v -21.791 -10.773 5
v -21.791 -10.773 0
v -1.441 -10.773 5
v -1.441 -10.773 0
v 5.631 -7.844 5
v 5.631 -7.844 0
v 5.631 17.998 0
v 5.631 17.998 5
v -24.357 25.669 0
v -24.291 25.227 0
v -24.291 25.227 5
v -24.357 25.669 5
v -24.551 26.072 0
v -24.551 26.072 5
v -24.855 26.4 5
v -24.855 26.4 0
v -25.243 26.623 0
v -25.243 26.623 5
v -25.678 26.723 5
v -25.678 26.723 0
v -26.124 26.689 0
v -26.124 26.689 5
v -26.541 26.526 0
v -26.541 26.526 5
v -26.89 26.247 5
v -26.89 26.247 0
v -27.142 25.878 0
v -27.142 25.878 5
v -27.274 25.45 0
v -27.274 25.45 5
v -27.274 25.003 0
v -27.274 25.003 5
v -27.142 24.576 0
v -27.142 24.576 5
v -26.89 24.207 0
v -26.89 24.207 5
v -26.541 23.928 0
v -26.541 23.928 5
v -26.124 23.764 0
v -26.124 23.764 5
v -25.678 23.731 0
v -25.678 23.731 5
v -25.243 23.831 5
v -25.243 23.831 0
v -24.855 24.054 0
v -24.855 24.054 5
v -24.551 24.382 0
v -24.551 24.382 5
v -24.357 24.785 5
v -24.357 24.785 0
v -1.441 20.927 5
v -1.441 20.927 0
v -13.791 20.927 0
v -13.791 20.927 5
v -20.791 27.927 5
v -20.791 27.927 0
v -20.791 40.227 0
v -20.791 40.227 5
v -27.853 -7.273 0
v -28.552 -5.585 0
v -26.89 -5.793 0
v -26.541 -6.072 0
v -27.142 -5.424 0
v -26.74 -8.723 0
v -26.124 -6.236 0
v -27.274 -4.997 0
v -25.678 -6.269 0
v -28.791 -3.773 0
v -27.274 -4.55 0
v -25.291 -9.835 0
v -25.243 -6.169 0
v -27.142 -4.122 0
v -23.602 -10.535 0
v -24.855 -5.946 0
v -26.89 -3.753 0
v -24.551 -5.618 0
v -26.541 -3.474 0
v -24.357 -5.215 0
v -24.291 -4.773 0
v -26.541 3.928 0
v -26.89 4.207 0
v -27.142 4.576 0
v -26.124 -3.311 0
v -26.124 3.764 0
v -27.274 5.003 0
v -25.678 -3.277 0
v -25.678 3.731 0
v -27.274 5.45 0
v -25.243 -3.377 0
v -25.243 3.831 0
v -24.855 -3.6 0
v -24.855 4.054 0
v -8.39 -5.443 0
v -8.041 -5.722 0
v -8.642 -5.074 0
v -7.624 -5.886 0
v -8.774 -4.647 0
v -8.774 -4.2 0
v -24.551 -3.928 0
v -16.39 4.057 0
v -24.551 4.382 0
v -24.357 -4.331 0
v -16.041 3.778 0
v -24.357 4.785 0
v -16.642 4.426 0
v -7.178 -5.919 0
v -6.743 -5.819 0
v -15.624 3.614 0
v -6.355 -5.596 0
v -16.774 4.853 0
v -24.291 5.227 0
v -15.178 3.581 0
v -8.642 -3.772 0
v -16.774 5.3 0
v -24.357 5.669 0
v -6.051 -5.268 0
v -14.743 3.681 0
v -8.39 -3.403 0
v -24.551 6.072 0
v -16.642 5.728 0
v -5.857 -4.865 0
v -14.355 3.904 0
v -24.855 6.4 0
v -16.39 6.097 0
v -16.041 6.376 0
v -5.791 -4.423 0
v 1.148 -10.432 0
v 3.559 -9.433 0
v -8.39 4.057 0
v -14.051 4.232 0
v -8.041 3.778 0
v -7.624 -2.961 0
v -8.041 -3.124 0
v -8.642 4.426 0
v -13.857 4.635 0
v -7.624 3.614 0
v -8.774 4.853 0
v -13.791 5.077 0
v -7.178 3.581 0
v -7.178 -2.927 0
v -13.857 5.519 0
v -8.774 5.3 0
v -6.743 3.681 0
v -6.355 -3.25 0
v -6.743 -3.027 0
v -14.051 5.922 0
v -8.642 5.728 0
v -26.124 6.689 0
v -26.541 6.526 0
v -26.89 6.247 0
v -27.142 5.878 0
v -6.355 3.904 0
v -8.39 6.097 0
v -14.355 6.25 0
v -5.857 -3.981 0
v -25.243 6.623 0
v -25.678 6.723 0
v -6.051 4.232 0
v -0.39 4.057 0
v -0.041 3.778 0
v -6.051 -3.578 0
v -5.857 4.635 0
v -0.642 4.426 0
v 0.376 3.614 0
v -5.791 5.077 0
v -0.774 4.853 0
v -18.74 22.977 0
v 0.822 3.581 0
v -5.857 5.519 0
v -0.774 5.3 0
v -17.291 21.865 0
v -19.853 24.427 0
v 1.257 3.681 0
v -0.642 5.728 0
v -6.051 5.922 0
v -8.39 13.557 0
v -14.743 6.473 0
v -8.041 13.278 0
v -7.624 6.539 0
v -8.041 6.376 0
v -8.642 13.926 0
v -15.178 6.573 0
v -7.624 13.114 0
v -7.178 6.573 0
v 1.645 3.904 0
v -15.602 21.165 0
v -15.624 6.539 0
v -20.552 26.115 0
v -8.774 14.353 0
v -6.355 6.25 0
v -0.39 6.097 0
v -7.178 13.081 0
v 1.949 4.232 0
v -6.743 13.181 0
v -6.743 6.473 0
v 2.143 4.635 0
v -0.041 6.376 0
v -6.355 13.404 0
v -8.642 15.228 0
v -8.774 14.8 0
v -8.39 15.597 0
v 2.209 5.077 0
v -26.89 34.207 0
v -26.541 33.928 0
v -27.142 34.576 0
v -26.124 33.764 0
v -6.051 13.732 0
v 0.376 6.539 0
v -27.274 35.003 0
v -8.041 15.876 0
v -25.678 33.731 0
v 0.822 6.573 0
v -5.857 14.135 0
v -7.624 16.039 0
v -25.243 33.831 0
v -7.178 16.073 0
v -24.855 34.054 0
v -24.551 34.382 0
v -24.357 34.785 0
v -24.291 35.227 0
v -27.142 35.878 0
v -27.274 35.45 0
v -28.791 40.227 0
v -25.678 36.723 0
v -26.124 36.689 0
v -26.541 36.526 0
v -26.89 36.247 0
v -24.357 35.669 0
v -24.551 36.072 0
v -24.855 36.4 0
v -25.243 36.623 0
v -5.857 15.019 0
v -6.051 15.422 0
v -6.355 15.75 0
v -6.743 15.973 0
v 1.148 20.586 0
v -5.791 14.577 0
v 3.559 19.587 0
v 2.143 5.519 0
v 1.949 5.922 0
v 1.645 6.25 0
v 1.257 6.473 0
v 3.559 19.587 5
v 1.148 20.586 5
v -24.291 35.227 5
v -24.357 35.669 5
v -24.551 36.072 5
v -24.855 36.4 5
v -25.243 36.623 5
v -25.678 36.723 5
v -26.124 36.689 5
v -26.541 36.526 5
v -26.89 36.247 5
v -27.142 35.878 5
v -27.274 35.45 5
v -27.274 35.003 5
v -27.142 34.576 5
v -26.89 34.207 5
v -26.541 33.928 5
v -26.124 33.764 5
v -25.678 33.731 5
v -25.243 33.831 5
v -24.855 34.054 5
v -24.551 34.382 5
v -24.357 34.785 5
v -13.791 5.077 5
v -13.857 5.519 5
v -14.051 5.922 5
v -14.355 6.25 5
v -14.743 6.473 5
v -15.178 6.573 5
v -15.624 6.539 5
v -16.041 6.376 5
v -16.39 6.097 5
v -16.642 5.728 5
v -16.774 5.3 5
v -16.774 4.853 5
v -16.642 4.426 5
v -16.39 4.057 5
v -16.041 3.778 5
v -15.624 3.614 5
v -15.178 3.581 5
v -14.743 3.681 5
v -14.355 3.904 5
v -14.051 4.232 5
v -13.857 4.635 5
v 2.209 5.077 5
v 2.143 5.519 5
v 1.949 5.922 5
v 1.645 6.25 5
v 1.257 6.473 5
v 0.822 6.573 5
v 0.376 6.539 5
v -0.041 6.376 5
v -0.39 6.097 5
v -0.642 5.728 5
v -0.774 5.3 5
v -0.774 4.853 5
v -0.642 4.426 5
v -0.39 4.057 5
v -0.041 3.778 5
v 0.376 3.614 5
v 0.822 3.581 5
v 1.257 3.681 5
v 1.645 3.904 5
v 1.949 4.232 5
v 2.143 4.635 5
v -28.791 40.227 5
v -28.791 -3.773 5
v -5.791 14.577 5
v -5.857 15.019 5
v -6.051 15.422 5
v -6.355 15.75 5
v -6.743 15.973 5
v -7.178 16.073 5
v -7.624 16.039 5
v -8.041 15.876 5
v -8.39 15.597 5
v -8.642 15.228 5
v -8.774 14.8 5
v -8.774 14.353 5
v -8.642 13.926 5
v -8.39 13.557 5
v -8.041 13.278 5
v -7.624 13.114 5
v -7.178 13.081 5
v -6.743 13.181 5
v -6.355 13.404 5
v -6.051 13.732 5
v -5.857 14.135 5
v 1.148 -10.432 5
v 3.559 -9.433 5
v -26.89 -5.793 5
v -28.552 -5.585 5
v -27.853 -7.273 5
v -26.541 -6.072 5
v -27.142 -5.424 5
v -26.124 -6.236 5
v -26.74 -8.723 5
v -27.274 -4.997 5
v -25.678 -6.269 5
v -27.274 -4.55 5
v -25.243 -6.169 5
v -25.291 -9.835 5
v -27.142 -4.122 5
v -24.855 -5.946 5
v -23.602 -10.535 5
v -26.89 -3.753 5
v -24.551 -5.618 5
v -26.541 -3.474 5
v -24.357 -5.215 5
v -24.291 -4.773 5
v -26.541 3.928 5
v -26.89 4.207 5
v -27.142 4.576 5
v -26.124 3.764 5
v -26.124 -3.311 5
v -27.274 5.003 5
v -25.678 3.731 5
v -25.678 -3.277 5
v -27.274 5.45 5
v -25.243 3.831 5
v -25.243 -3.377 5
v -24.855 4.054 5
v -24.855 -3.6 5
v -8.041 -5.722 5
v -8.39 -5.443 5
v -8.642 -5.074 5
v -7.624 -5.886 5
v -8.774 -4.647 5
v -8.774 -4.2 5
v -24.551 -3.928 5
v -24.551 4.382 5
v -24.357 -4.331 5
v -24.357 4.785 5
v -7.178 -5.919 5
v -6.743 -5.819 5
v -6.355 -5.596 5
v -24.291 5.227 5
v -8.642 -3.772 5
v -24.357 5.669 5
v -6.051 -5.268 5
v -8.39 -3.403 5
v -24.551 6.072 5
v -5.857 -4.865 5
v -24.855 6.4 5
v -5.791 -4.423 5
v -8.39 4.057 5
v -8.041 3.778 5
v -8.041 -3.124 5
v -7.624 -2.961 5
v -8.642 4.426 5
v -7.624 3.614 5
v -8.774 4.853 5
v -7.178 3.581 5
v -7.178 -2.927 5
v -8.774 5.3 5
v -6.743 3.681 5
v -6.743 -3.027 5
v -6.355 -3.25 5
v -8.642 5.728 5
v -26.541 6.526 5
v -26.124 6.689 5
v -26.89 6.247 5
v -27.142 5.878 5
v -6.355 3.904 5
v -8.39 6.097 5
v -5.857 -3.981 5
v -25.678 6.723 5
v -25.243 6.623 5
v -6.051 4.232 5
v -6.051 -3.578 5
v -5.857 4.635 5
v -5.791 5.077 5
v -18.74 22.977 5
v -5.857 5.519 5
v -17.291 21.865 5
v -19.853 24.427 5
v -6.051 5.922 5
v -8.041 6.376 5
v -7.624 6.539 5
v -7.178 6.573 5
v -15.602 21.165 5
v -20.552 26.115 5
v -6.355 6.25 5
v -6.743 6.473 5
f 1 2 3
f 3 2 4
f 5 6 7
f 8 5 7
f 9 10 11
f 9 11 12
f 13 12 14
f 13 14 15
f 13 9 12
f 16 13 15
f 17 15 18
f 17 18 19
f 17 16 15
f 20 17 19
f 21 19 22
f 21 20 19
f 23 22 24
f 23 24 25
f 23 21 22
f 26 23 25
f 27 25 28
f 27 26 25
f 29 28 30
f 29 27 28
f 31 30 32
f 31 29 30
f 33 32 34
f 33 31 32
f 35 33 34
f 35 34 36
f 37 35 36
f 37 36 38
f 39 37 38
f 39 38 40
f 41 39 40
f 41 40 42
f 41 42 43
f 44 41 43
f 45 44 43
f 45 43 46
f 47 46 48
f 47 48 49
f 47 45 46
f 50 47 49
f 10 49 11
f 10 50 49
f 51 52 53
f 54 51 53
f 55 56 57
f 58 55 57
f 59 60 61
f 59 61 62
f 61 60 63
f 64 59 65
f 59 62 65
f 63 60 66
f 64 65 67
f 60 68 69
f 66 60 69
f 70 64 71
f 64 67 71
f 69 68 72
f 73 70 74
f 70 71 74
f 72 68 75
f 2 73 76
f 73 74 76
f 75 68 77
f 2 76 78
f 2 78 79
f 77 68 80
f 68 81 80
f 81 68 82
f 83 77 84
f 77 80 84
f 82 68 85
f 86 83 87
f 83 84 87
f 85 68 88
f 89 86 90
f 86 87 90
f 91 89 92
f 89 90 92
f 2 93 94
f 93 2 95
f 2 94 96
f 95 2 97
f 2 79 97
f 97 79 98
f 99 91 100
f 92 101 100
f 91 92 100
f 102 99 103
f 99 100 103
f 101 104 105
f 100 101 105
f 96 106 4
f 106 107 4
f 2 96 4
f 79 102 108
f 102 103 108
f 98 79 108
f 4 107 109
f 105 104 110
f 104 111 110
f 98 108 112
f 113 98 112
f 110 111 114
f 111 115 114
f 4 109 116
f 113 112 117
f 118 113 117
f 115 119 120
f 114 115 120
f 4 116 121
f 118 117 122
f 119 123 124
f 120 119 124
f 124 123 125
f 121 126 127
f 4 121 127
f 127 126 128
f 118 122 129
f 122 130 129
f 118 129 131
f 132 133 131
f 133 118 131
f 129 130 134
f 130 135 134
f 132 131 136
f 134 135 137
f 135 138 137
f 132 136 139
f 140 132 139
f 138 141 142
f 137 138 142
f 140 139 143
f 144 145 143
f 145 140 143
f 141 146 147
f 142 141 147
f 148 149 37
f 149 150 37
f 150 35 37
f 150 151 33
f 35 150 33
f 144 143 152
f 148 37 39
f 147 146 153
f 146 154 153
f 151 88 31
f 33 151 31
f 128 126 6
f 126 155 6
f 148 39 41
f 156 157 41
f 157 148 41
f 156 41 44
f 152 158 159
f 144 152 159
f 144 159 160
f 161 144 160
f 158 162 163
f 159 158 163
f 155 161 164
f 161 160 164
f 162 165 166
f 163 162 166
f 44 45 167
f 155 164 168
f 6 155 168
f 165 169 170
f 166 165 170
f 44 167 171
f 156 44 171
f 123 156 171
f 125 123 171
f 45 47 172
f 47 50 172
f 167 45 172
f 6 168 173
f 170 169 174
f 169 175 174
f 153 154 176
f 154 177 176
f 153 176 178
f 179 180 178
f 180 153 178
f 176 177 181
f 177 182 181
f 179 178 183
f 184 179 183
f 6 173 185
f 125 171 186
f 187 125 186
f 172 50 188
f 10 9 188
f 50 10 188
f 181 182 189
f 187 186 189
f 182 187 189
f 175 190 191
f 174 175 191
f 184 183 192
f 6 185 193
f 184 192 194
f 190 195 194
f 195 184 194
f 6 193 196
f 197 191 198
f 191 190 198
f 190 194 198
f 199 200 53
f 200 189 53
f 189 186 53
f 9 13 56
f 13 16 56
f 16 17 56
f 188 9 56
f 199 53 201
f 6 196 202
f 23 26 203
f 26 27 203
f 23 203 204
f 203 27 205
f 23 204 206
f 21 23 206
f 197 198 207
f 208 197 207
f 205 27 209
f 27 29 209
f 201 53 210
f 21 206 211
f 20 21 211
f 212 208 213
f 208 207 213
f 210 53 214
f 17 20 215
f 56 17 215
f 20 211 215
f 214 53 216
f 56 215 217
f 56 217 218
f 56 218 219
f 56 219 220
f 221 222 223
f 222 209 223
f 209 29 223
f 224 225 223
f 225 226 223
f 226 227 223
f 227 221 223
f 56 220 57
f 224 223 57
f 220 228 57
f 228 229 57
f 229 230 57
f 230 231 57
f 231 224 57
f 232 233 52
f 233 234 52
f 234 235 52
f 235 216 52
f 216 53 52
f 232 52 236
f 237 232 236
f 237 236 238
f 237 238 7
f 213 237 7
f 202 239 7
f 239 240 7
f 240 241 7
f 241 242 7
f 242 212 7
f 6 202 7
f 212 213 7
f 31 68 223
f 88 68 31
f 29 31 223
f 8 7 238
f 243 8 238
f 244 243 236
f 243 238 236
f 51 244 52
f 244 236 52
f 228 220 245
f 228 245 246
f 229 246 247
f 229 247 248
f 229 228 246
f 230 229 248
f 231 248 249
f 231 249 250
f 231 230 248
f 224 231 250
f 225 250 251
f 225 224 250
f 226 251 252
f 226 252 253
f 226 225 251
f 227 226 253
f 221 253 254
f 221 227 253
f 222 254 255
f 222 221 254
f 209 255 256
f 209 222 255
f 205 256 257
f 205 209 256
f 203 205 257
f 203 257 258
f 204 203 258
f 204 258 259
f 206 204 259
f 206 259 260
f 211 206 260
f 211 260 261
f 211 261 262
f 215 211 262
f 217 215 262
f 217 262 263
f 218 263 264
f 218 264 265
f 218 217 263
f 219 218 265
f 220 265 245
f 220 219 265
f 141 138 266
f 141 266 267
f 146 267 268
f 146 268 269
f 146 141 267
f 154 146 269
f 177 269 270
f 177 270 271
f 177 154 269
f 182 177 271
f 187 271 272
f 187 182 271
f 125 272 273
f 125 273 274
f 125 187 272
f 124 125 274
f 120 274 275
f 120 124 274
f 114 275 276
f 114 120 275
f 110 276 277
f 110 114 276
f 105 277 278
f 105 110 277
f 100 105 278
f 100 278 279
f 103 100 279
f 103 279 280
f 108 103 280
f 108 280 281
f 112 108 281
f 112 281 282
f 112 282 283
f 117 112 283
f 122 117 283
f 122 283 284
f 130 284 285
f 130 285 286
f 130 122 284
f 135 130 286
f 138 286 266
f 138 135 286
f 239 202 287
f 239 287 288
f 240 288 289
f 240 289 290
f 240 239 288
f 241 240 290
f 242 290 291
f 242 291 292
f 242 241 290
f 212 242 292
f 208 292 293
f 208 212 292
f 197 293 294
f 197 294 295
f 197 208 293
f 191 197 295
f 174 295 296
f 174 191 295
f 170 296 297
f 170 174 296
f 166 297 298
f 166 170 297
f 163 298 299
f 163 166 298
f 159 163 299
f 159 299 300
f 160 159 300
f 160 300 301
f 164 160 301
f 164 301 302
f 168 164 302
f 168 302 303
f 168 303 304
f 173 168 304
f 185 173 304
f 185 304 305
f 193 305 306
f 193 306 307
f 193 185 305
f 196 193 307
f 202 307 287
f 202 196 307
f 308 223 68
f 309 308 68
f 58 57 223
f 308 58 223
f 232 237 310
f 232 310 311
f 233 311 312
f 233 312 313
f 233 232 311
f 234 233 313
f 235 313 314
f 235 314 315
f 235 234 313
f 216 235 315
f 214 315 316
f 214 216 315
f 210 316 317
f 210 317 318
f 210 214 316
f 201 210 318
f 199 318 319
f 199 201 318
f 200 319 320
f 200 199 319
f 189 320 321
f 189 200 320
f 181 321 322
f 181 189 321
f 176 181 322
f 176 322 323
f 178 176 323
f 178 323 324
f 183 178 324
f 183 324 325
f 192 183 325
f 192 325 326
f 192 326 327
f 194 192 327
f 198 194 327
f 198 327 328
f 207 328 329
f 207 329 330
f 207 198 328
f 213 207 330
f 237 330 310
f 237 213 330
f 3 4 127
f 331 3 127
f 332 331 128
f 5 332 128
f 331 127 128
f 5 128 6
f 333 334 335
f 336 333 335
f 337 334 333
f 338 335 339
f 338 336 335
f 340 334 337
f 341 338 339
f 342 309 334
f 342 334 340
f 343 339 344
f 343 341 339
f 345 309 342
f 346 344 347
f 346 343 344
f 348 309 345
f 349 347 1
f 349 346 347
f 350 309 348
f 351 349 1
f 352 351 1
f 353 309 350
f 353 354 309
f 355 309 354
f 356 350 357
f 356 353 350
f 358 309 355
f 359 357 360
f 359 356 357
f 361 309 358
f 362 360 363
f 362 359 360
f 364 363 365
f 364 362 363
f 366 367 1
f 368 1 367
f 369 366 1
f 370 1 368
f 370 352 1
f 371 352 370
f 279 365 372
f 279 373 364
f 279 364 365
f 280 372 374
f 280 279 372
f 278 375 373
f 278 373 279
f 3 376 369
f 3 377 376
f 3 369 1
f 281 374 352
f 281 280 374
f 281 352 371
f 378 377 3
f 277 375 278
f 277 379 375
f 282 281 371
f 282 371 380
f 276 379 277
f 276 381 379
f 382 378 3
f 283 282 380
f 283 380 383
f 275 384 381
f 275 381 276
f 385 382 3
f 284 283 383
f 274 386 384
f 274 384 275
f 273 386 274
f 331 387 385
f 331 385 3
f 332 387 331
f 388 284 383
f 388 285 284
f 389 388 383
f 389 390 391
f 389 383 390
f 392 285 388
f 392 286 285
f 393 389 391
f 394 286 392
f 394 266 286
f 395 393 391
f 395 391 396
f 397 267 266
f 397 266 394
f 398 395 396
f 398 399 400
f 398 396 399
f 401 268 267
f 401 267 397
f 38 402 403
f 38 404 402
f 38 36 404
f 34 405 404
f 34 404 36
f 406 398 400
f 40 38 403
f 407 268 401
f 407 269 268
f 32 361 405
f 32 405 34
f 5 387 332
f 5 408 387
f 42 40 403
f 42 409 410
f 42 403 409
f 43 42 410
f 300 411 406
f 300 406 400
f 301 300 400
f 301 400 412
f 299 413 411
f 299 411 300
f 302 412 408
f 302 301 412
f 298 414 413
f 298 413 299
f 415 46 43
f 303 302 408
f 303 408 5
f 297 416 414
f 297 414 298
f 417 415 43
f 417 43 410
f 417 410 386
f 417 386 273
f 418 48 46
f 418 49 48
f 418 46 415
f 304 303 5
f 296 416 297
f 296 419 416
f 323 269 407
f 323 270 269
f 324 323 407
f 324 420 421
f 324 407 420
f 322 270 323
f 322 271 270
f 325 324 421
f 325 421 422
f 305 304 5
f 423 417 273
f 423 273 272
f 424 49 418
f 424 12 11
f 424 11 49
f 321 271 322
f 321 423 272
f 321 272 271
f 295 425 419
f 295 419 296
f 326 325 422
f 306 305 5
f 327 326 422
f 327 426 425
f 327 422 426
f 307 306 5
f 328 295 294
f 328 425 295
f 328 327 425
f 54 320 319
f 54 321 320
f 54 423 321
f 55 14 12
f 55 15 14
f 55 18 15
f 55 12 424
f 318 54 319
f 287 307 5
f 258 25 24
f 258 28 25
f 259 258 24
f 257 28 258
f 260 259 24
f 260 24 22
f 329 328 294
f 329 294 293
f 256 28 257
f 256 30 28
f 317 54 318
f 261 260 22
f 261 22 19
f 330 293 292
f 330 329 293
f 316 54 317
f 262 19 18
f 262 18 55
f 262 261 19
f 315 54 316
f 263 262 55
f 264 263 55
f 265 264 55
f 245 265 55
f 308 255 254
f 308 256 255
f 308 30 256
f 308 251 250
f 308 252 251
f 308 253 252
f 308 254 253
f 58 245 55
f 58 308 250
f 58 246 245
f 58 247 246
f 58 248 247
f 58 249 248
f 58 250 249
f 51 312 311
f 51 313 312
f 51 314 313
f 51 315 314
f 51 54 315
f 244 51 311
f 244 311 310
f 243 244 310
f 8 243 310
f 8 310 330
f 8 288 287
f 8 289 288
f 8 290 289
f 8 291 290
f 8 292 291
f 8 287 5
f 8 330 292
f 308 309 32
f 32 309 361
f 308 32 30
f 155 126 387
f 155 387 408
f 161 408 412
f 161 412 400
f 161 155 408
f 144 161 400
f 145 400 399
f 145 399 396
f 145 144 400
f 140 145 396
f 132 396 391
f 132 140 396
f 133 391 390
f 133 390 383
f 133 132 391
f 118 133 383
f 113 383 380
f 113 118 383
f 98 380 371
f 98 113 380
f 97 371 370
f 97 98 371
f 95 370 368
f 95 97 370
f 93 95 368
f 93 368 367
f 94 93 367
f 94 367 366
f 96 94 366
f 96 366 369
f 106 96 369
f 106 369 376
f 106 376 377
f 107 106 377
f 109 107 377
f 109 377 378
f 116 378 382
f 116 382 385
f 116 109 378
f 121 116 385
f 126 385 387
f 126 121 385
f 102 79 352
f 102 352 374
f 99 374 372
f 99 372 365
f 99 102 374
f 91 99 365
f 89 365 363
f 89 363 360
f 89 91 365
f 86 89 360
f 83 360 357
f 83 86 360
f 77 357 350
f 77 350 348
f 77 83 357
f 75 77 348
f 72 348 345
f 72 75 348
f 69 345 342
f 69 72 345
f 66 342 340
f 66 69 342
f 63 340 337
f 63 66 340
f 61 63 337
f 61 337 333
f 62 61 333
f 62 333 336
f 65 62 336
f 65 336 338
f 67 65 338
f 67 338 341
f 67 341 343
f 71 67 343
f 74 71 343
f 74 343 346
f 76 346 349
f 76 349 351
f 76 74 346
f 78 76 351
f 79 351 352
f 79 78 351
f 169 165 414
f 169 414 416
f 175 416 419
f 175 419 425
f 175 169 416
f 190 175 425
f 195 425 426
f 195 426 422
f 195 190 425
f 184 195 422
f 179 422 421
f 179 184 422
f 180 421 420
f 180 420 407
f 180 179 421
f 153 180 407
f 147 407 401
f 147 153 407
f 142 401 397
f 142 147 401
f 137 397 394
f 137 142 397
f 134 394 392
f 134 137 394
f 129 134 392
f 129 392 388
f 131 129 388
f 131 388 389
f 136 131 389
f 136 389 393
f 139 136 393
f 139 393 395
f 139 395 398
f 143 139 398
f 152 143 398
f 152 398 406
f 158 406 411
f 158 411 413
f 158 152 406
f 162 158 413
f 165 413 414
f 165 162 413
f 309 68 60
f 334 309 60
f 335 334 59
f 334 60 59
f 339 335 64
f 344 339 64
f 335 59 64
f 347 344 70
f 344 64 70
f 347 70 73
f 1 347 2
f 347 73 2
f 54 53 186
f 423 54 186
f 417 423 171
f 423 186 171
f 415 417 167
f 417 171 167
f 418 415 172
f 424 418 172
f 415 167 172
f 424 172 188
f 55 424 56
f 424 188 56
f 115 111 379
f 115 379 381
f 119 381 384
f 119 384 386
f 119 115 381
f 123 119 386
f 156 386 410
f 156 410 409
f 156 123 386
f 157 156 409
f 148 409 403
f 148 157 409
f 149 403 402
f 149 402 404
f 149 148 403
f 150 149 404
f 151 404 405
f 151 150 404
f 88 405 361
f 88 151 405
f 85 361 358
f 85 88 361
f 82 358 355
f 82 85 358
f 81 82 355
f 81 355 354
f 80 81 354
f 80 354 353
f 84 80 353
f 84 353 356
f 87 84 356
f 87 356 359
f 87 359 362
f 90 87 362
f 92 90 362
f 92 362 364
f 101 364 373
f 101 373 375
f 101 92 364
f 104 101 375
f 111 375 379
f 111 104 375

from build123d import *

# Parameters (mm, degrees)
CROQUIS1_R              = 1.5
SALIENTE_EXTRUIR1_DEPTH = 5


with BuildPart() as part:
    # Croquis1 → Saliente-Extruir1 (new body)
    with BuildSketch(Plane.XY):
        with BuildLine():
            Line((-28.790532902, 40.226856436), (-28.790532902, 20.926856436))
            Line((-28.790532902, 20.926856436), (-28.790532902, -0.073143564))
            Line((-28.790532902, -0.073143564), (-28.790532902, -3.773143564))
            ThreePointArc((-28.790532902, -3.773143564), (-26.740280371, -8.722891033), (-21.790532902, -10.773143564))
            Line((-21.790532902, -10.773143564), (-1.440532902, -10.773143564))
            ThreePointArc((-1.440532902, -10.773143564), (2.386301421, -10.011938889), (5.630534909, -7.844211376))
            Line((5.630534909, -7.844211376), (5.630534909, 17.997924248))
            ThreePointArc((5.630534909, 17.997924248), (2.386301421, 20.165651761), (-1.440532902, 20.926856436))
            Line((-1.440532902, 20.926856436), (-13.790532902, 20.926856436))
            ThreePointArc((-13.790532902, 20.926856436), (-18.740280371, 22.977108967), (-20.790532902, 27.926856436))
            Line((-20.790532902, 27.926856436), (-20.790532902, 40.226856436))
            Line((-20.790532902, 40.226856436), (-28.790532902, 40.226856436))
        make_face()
        with Locations((-25.790532902, -4.773143564)):
            Circle(CROQUIS1_R, mode=Mode.SUBTRACT)
        with Locations((-25.790532902, 5.226856436)):
            Circle(CROQUIS1_R, mode=Mode.SUBTRACT)
        with Locations((-15.290532902, 5.076856436)):
            Circle(CROQUIS1_R, mode=Mode.SUBTRACT)
        with Locations((-7.290532902, -4.423143564)):
            Circle(CROQUIS1_R, mode=Mode.SUBTRACT)
        with Locations((-7.290532902, 5.076856436)):
            Circle(CROQUIS1_R, mode=Mode.SUBTRACT)
        with Locations((-7.290532902, 14.576856436)):
            Circle(CROQUIS1_R, mode=Mode.SUBTRACT)
        with Locations((0.709467098, 5.076856436)):
            Circle(CROQUIS1_R, mode=Mode.SUBTRACT)
        with Locations((-25.790532902, 25.226856436)):
            Circle(CROQUIS1_R, mode=Mode.SUBTRACT)
        with Locations((-25.790532902, 35.226856436)):
            Circle(CROQUIS1_R, mode=Mode.SUBTRACT)
    extrude(amount=SALIENTE_EXTRUIR1_DEPTH)


solid = part.part
